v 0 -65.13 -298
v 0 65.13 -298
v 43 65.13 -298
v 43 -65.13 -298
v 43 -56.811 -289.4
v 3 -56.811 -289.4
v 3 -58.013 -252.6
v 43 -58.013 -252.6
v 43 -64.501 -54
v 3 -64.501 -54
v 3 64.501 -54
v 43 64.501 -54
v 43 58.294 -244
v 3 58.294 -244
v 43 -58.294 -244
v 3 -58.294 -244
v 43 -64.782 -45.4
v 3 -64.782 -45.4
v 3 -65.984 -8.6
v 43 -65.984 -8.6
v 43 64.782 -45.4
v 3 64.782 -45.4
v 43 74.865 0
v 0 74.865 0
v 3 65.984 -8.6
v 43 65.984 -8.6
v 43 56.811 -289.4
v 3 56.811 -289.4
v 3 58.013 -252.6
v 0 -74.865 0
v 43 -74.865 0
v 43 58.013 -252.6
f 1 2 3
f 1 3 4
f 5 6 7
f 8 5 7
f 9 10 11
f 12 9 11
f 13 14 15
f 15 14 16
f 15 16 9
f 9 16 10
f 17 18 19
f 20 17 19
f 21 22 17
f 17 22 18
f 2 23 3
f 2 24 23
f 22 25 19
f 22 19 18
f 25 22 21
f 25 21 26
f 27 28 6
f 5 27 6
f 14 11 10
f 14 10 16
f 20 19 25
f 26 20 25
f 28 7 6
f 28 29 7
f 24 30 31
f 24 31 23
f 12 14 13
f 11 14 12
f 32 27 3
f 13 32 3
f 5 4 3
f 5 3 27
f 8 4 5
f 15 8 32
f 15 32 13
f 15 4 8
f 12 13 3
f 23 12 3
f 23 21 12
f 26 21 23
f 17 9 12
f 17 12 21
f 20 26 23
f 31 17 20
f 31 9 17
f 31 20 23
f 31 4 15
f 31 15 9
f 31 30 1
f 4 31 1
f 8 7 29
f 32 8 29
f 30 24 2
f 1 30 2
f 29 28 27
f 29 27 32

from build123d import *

# Parameters (mm, degrees)
BOSS_EXTRUDE1_DEPTH = 3
BOSS_EXTRUDE2_DEPTH = 40


with BuildPart() as part:
    # Sketch1 → Boss-Extrude1 (new body)
    with BuildSketch(Plane(origin=(0, 0, 0), x_dir=(0, 0, -1), z_dir=(1, 0, 0))):
        Polygon((0, 74.865), (0, -74.865), (298, -65.13), (298, 65.13), align=None)
    extrude(amount=BOSS_EXTRUDE1_DEPTH)

    # Sketch2 → Boss-Extrude2 (add)
    with BuildSketch(Plane(origin=(3, 0, 0), x_dir=(0, 0, -1), z_dir=(1, 0, 0))):
        Polygon((0, 74.865), (298, 65.13), (298, 56.53), (298, 0), (289.4, 0), (289.4, 56.810942953), (252.6, 58.01311745), (252.6, 0), (244, 0), (244, 58.294060403), (54, 64.500939597), (54, 0), (45.4, 0), (45.4, 64.78188255), (8.6, 65.984057047), (8.6, 0), (0, 0), (0, 66.265), align=None)
    boss_extrude2 = extrude(amount=BOSS_EXTRUDE2_DEPTH)

    # Mirror1: Boss-Extrude2 across plane
    add(boss_extrude2.mirror(Plane(origin=(43, 0, -45.4), x_dir=(0, 0, 1), z_dir=(0, 1, 0))))


solid = part.part
